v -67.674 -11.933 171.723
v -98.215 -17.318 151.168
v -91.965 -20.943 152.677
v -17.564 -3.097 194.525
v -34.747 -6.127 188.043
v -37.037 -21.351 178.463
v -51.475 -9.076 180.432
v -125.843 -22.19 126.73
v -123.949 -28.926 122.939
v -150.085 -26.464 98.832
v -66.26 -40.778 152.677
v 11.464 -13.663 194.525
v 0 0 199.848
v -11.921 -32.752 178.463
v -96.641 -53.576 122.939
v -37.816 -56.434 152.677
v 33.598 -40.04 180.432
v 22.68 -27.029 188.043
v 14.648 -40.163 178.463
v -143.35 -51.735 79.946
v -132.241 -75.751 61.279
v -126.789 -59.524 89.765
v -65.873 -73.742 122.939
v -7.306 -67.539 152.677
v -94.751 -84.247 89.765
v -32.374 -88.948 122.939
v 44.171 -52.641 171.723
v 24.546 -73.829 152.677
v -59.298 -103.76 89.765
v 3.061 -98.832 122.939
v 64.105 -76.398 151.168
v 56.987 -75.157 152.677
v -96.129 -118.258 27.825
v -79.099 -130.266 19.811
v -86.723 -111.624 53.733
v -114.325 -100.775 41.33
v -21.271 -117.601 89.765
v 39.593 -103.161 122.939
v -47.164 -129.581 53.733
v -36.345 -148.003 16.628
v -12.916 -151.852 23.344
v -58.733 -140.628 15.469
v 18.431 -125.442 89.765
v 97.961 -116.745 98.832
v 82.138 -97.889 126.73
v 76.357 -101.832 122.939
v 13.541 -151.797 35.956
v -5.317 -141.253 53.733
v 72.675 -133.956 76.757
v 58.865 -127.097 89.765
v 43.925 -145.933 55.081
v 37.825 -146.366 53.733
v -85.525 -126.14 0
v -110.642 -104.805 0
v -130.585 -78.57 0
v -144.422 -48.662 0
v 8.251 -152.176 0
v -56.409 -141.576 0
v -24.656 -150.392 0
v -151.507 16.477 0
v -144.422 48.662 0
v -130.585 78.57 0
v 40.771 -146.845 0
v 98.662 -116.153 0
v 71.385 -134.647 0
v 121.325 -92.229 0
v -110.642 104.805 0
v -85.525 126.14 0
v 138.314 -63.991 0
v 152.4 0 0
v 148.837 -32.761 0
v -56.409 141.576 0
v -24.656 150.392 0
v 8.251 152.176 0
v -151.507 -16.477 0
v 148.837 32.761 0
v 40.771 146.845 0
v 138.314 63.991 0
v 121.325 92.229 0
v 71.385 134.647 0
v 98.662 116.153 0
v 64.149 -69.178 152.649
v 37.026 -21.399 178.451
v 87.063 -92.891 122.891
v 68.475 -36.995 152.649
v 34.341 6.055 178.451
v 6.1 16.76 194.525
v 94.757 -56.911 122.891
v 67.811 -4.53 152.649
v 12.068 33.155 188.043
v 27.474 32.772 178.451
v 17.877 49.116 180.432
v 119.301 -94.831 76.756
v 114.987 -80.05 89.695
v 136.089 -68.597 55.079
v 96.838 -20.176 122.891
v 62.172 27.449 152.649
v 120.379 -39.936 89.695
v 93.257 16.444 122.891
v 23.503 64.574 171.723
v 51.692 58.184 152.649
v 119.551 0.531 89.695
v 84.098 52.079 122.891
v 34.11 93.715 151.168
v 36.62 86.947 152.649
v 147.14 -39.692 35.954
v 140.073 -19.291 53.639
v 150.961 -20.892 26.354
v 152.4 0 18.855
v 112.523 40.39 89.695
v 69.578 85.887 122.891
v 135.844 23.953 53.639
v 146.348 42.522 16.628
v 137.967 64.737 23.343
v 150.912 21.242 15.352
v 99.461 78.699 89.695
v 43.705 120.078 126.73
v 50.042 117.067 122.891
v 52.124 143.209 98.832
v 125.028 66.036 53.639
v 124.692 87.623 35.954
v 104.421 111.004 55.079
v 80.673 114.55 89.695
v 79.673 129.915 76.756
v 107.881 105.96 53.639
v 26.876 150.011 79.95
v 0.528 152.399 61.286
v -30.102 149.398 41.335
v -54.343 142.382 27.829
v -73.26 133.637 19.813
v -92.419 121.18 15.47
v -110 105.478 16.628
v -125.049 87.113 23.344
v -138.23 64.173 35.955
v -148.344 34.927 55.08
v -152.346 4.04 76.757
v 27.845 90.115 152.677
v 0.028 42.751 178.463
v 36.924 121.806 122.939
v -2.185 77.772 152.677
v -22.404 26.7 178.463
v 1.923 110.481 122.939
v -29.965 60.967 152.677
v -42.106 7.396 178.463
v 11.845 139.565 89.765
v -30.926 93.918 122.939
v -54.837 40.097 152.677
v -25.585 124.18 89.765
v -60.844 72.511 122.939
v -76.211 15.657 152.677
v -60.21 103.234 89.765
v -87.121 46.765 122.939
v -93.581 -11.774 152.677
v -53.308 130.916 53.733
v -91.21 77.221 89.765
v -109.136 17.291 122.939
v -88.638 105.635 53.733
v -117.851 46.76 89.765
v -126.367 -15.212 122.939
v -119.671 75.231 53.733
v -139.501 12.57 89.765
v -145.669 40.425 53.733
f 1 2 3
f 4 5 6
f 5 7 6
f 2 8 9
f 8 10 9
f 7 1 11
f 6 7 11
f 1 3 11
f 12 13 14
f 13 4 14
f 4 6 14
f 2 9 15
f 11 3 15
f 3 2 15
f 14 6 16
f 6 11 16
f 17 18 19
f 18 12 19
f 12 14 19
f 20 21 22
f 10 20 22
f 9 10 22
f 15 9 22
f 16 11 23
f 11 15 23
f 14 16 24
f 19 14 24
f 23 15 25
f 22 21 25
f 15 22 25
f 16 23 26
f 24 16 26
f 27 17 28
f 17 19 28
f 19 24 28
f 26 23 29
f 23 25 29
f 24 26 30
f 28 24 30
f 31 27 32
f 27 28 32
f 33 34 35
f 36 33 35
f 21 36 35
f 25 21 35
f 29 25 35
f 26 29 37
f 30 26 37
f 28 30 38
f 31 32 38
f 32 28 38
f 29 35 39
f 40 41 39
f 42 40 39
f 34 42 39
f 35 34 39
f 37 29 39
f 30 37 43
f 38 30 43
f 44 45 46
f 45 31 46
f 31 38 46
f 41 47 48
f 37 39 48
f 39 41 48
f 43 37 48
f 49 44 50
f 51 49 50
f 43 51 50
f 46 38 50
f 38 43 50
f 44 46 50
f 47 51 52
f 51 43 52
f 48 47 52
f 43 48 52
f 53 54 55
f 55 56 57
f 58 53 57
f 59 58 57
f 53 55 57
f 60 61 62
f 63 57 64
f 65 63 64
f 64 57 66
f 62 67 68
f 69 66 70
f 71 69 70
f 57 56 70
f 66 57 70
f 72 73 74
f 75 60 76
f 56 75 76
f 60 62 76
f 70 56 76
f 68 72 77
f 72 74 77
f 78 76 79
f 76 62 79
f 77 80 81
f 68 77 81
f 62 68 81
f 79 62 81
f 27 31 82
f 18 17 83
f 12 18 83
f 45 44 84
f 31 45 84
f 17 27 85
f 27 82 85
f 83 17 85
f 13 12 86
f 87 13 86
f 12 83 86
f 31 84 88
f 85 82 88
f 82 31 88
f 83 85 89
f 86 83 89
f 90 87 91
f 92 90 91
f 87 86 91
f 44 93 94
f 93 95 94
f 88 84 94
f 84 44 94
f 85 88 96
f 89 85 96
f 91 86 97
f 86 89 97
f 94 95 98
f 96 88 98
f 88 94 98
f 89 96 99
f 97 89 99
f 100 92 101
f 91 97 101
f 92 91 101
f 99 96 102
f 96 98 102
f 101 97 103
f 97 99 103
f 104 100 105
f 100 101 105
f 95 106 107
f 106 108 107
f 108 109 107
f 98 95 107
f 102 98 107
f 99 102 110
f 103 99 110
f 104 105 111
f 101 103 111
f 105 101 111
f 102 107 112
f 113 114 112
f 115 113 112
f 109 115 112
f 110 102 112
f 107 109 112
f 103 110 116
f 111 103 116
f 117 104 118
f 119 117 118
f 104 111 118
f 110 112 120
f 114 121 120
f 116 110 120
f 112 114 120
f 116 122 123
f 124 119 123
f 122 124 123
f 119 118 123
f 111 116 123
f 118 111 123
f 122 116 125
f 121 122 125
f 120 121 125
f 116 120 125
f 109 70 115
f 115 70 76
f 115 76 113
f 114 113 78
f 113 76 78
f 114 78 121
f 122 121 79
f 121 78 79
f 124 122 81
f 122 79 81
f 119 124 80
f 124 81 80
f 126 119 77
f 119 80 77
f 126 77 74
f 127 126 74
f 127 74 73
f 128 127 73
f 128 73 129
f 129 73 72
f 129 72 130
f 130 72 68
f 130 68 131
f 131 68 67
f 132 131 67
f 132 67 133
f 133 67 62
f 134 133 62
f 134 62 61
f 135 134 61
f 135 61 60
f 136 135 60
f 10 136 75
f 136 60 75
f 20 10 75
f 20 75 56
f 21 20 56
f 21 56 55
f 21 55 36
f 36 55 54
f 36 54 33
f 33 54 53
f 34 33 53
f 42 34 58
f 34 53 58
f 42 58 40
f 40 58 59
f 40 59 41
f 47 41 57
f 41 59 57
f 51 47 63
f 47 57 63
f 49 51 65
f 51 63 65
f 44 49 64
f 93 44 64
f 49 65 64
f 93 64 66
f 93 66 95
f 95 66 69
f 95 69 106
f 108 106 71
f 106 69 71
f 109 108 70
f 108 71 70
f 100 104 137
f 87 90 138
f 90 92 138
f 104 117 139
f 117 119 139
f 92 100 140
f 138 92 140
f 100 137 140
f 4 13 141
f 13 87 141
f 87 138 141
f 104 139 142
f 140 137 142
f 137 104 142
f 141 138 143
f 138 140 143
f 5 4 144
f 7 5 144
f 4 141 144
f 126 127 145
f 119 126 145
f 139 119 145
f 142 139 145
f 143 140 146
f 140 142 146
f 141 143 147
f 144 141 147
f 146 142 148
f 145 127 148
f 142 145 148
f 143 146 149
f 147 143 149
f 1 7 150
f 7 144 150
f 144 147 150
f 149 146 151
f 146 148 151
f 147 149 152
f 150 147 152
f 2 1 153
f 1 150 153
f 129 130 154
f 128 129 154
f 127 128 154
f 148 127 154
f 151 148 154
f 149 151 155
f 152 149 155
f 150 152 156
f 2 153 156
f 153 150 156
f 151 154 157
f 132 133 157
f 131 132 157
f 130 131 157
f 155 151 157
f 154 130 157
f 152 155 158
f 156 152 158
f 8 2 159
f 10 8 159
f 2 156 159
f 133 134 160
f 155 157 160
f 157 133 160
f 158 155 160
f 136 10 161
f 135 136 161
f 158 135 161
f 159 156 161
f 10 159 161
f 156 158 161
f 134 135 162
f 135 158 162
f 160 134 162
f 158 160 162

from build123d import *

# Parameters (mm, degrees)
SKETCH1_R           = 152.4
BOSS_EXTRUDE1_DEPTH = 300
CIRPATTERN1_COUNT   = 3


with BuildPart() as part:
    # Sketch1 → Boss-Extrude1 (new body)
    with BuildSketch(Plane.XY):
        Circle(SKETCH1_R)
    extrude(amount=BOSS_EXTRUDE1_DEPTH)

    # Sketch2 → Cut-Revolve1 (revolve, cut)
    with BuildSketch(Plane(origin=(0, 0, -90.9), x_dir=(-0.64278761, 0.766044443, 0), z_dir=(0.766044443, 0.64278761, 0))):
        with BuildLine():
            Line((-144.337567297, -293.6), (-144.337567297, -593.6))
            ThreePointArc((-144.337567297, -593.6), (465.662432703, 16.4), (-144.337567297, 626.4))
            Line((-144.337567297, 626.4), (-144.337567297, 326.4))
            ThreePointArc((-144.337567297, 326.4), (165.662432703, 16.4), (-144.337567297, -293.6))
        make_face()
    cut_revolve1 = revolve(axis=Axis((92.778399871, -110.568991361, -112.7), (0, 0, 1)), mode=Mode.SUBTRACT)

    # CirPattern1: Cut-Revolve1 ×3 about axis
    cirpattern1_axis = Axis((0, 0, 0), (0, 0, 1))
    for i in range(1, CIRPATTERN1_COUNT):
        add(cut_revolve1.rotate(cirpattern1_axis, i * 360 / CIRPATTERN1_COUNT), mode=Mode.SUBTRACT)


solid = part.part
